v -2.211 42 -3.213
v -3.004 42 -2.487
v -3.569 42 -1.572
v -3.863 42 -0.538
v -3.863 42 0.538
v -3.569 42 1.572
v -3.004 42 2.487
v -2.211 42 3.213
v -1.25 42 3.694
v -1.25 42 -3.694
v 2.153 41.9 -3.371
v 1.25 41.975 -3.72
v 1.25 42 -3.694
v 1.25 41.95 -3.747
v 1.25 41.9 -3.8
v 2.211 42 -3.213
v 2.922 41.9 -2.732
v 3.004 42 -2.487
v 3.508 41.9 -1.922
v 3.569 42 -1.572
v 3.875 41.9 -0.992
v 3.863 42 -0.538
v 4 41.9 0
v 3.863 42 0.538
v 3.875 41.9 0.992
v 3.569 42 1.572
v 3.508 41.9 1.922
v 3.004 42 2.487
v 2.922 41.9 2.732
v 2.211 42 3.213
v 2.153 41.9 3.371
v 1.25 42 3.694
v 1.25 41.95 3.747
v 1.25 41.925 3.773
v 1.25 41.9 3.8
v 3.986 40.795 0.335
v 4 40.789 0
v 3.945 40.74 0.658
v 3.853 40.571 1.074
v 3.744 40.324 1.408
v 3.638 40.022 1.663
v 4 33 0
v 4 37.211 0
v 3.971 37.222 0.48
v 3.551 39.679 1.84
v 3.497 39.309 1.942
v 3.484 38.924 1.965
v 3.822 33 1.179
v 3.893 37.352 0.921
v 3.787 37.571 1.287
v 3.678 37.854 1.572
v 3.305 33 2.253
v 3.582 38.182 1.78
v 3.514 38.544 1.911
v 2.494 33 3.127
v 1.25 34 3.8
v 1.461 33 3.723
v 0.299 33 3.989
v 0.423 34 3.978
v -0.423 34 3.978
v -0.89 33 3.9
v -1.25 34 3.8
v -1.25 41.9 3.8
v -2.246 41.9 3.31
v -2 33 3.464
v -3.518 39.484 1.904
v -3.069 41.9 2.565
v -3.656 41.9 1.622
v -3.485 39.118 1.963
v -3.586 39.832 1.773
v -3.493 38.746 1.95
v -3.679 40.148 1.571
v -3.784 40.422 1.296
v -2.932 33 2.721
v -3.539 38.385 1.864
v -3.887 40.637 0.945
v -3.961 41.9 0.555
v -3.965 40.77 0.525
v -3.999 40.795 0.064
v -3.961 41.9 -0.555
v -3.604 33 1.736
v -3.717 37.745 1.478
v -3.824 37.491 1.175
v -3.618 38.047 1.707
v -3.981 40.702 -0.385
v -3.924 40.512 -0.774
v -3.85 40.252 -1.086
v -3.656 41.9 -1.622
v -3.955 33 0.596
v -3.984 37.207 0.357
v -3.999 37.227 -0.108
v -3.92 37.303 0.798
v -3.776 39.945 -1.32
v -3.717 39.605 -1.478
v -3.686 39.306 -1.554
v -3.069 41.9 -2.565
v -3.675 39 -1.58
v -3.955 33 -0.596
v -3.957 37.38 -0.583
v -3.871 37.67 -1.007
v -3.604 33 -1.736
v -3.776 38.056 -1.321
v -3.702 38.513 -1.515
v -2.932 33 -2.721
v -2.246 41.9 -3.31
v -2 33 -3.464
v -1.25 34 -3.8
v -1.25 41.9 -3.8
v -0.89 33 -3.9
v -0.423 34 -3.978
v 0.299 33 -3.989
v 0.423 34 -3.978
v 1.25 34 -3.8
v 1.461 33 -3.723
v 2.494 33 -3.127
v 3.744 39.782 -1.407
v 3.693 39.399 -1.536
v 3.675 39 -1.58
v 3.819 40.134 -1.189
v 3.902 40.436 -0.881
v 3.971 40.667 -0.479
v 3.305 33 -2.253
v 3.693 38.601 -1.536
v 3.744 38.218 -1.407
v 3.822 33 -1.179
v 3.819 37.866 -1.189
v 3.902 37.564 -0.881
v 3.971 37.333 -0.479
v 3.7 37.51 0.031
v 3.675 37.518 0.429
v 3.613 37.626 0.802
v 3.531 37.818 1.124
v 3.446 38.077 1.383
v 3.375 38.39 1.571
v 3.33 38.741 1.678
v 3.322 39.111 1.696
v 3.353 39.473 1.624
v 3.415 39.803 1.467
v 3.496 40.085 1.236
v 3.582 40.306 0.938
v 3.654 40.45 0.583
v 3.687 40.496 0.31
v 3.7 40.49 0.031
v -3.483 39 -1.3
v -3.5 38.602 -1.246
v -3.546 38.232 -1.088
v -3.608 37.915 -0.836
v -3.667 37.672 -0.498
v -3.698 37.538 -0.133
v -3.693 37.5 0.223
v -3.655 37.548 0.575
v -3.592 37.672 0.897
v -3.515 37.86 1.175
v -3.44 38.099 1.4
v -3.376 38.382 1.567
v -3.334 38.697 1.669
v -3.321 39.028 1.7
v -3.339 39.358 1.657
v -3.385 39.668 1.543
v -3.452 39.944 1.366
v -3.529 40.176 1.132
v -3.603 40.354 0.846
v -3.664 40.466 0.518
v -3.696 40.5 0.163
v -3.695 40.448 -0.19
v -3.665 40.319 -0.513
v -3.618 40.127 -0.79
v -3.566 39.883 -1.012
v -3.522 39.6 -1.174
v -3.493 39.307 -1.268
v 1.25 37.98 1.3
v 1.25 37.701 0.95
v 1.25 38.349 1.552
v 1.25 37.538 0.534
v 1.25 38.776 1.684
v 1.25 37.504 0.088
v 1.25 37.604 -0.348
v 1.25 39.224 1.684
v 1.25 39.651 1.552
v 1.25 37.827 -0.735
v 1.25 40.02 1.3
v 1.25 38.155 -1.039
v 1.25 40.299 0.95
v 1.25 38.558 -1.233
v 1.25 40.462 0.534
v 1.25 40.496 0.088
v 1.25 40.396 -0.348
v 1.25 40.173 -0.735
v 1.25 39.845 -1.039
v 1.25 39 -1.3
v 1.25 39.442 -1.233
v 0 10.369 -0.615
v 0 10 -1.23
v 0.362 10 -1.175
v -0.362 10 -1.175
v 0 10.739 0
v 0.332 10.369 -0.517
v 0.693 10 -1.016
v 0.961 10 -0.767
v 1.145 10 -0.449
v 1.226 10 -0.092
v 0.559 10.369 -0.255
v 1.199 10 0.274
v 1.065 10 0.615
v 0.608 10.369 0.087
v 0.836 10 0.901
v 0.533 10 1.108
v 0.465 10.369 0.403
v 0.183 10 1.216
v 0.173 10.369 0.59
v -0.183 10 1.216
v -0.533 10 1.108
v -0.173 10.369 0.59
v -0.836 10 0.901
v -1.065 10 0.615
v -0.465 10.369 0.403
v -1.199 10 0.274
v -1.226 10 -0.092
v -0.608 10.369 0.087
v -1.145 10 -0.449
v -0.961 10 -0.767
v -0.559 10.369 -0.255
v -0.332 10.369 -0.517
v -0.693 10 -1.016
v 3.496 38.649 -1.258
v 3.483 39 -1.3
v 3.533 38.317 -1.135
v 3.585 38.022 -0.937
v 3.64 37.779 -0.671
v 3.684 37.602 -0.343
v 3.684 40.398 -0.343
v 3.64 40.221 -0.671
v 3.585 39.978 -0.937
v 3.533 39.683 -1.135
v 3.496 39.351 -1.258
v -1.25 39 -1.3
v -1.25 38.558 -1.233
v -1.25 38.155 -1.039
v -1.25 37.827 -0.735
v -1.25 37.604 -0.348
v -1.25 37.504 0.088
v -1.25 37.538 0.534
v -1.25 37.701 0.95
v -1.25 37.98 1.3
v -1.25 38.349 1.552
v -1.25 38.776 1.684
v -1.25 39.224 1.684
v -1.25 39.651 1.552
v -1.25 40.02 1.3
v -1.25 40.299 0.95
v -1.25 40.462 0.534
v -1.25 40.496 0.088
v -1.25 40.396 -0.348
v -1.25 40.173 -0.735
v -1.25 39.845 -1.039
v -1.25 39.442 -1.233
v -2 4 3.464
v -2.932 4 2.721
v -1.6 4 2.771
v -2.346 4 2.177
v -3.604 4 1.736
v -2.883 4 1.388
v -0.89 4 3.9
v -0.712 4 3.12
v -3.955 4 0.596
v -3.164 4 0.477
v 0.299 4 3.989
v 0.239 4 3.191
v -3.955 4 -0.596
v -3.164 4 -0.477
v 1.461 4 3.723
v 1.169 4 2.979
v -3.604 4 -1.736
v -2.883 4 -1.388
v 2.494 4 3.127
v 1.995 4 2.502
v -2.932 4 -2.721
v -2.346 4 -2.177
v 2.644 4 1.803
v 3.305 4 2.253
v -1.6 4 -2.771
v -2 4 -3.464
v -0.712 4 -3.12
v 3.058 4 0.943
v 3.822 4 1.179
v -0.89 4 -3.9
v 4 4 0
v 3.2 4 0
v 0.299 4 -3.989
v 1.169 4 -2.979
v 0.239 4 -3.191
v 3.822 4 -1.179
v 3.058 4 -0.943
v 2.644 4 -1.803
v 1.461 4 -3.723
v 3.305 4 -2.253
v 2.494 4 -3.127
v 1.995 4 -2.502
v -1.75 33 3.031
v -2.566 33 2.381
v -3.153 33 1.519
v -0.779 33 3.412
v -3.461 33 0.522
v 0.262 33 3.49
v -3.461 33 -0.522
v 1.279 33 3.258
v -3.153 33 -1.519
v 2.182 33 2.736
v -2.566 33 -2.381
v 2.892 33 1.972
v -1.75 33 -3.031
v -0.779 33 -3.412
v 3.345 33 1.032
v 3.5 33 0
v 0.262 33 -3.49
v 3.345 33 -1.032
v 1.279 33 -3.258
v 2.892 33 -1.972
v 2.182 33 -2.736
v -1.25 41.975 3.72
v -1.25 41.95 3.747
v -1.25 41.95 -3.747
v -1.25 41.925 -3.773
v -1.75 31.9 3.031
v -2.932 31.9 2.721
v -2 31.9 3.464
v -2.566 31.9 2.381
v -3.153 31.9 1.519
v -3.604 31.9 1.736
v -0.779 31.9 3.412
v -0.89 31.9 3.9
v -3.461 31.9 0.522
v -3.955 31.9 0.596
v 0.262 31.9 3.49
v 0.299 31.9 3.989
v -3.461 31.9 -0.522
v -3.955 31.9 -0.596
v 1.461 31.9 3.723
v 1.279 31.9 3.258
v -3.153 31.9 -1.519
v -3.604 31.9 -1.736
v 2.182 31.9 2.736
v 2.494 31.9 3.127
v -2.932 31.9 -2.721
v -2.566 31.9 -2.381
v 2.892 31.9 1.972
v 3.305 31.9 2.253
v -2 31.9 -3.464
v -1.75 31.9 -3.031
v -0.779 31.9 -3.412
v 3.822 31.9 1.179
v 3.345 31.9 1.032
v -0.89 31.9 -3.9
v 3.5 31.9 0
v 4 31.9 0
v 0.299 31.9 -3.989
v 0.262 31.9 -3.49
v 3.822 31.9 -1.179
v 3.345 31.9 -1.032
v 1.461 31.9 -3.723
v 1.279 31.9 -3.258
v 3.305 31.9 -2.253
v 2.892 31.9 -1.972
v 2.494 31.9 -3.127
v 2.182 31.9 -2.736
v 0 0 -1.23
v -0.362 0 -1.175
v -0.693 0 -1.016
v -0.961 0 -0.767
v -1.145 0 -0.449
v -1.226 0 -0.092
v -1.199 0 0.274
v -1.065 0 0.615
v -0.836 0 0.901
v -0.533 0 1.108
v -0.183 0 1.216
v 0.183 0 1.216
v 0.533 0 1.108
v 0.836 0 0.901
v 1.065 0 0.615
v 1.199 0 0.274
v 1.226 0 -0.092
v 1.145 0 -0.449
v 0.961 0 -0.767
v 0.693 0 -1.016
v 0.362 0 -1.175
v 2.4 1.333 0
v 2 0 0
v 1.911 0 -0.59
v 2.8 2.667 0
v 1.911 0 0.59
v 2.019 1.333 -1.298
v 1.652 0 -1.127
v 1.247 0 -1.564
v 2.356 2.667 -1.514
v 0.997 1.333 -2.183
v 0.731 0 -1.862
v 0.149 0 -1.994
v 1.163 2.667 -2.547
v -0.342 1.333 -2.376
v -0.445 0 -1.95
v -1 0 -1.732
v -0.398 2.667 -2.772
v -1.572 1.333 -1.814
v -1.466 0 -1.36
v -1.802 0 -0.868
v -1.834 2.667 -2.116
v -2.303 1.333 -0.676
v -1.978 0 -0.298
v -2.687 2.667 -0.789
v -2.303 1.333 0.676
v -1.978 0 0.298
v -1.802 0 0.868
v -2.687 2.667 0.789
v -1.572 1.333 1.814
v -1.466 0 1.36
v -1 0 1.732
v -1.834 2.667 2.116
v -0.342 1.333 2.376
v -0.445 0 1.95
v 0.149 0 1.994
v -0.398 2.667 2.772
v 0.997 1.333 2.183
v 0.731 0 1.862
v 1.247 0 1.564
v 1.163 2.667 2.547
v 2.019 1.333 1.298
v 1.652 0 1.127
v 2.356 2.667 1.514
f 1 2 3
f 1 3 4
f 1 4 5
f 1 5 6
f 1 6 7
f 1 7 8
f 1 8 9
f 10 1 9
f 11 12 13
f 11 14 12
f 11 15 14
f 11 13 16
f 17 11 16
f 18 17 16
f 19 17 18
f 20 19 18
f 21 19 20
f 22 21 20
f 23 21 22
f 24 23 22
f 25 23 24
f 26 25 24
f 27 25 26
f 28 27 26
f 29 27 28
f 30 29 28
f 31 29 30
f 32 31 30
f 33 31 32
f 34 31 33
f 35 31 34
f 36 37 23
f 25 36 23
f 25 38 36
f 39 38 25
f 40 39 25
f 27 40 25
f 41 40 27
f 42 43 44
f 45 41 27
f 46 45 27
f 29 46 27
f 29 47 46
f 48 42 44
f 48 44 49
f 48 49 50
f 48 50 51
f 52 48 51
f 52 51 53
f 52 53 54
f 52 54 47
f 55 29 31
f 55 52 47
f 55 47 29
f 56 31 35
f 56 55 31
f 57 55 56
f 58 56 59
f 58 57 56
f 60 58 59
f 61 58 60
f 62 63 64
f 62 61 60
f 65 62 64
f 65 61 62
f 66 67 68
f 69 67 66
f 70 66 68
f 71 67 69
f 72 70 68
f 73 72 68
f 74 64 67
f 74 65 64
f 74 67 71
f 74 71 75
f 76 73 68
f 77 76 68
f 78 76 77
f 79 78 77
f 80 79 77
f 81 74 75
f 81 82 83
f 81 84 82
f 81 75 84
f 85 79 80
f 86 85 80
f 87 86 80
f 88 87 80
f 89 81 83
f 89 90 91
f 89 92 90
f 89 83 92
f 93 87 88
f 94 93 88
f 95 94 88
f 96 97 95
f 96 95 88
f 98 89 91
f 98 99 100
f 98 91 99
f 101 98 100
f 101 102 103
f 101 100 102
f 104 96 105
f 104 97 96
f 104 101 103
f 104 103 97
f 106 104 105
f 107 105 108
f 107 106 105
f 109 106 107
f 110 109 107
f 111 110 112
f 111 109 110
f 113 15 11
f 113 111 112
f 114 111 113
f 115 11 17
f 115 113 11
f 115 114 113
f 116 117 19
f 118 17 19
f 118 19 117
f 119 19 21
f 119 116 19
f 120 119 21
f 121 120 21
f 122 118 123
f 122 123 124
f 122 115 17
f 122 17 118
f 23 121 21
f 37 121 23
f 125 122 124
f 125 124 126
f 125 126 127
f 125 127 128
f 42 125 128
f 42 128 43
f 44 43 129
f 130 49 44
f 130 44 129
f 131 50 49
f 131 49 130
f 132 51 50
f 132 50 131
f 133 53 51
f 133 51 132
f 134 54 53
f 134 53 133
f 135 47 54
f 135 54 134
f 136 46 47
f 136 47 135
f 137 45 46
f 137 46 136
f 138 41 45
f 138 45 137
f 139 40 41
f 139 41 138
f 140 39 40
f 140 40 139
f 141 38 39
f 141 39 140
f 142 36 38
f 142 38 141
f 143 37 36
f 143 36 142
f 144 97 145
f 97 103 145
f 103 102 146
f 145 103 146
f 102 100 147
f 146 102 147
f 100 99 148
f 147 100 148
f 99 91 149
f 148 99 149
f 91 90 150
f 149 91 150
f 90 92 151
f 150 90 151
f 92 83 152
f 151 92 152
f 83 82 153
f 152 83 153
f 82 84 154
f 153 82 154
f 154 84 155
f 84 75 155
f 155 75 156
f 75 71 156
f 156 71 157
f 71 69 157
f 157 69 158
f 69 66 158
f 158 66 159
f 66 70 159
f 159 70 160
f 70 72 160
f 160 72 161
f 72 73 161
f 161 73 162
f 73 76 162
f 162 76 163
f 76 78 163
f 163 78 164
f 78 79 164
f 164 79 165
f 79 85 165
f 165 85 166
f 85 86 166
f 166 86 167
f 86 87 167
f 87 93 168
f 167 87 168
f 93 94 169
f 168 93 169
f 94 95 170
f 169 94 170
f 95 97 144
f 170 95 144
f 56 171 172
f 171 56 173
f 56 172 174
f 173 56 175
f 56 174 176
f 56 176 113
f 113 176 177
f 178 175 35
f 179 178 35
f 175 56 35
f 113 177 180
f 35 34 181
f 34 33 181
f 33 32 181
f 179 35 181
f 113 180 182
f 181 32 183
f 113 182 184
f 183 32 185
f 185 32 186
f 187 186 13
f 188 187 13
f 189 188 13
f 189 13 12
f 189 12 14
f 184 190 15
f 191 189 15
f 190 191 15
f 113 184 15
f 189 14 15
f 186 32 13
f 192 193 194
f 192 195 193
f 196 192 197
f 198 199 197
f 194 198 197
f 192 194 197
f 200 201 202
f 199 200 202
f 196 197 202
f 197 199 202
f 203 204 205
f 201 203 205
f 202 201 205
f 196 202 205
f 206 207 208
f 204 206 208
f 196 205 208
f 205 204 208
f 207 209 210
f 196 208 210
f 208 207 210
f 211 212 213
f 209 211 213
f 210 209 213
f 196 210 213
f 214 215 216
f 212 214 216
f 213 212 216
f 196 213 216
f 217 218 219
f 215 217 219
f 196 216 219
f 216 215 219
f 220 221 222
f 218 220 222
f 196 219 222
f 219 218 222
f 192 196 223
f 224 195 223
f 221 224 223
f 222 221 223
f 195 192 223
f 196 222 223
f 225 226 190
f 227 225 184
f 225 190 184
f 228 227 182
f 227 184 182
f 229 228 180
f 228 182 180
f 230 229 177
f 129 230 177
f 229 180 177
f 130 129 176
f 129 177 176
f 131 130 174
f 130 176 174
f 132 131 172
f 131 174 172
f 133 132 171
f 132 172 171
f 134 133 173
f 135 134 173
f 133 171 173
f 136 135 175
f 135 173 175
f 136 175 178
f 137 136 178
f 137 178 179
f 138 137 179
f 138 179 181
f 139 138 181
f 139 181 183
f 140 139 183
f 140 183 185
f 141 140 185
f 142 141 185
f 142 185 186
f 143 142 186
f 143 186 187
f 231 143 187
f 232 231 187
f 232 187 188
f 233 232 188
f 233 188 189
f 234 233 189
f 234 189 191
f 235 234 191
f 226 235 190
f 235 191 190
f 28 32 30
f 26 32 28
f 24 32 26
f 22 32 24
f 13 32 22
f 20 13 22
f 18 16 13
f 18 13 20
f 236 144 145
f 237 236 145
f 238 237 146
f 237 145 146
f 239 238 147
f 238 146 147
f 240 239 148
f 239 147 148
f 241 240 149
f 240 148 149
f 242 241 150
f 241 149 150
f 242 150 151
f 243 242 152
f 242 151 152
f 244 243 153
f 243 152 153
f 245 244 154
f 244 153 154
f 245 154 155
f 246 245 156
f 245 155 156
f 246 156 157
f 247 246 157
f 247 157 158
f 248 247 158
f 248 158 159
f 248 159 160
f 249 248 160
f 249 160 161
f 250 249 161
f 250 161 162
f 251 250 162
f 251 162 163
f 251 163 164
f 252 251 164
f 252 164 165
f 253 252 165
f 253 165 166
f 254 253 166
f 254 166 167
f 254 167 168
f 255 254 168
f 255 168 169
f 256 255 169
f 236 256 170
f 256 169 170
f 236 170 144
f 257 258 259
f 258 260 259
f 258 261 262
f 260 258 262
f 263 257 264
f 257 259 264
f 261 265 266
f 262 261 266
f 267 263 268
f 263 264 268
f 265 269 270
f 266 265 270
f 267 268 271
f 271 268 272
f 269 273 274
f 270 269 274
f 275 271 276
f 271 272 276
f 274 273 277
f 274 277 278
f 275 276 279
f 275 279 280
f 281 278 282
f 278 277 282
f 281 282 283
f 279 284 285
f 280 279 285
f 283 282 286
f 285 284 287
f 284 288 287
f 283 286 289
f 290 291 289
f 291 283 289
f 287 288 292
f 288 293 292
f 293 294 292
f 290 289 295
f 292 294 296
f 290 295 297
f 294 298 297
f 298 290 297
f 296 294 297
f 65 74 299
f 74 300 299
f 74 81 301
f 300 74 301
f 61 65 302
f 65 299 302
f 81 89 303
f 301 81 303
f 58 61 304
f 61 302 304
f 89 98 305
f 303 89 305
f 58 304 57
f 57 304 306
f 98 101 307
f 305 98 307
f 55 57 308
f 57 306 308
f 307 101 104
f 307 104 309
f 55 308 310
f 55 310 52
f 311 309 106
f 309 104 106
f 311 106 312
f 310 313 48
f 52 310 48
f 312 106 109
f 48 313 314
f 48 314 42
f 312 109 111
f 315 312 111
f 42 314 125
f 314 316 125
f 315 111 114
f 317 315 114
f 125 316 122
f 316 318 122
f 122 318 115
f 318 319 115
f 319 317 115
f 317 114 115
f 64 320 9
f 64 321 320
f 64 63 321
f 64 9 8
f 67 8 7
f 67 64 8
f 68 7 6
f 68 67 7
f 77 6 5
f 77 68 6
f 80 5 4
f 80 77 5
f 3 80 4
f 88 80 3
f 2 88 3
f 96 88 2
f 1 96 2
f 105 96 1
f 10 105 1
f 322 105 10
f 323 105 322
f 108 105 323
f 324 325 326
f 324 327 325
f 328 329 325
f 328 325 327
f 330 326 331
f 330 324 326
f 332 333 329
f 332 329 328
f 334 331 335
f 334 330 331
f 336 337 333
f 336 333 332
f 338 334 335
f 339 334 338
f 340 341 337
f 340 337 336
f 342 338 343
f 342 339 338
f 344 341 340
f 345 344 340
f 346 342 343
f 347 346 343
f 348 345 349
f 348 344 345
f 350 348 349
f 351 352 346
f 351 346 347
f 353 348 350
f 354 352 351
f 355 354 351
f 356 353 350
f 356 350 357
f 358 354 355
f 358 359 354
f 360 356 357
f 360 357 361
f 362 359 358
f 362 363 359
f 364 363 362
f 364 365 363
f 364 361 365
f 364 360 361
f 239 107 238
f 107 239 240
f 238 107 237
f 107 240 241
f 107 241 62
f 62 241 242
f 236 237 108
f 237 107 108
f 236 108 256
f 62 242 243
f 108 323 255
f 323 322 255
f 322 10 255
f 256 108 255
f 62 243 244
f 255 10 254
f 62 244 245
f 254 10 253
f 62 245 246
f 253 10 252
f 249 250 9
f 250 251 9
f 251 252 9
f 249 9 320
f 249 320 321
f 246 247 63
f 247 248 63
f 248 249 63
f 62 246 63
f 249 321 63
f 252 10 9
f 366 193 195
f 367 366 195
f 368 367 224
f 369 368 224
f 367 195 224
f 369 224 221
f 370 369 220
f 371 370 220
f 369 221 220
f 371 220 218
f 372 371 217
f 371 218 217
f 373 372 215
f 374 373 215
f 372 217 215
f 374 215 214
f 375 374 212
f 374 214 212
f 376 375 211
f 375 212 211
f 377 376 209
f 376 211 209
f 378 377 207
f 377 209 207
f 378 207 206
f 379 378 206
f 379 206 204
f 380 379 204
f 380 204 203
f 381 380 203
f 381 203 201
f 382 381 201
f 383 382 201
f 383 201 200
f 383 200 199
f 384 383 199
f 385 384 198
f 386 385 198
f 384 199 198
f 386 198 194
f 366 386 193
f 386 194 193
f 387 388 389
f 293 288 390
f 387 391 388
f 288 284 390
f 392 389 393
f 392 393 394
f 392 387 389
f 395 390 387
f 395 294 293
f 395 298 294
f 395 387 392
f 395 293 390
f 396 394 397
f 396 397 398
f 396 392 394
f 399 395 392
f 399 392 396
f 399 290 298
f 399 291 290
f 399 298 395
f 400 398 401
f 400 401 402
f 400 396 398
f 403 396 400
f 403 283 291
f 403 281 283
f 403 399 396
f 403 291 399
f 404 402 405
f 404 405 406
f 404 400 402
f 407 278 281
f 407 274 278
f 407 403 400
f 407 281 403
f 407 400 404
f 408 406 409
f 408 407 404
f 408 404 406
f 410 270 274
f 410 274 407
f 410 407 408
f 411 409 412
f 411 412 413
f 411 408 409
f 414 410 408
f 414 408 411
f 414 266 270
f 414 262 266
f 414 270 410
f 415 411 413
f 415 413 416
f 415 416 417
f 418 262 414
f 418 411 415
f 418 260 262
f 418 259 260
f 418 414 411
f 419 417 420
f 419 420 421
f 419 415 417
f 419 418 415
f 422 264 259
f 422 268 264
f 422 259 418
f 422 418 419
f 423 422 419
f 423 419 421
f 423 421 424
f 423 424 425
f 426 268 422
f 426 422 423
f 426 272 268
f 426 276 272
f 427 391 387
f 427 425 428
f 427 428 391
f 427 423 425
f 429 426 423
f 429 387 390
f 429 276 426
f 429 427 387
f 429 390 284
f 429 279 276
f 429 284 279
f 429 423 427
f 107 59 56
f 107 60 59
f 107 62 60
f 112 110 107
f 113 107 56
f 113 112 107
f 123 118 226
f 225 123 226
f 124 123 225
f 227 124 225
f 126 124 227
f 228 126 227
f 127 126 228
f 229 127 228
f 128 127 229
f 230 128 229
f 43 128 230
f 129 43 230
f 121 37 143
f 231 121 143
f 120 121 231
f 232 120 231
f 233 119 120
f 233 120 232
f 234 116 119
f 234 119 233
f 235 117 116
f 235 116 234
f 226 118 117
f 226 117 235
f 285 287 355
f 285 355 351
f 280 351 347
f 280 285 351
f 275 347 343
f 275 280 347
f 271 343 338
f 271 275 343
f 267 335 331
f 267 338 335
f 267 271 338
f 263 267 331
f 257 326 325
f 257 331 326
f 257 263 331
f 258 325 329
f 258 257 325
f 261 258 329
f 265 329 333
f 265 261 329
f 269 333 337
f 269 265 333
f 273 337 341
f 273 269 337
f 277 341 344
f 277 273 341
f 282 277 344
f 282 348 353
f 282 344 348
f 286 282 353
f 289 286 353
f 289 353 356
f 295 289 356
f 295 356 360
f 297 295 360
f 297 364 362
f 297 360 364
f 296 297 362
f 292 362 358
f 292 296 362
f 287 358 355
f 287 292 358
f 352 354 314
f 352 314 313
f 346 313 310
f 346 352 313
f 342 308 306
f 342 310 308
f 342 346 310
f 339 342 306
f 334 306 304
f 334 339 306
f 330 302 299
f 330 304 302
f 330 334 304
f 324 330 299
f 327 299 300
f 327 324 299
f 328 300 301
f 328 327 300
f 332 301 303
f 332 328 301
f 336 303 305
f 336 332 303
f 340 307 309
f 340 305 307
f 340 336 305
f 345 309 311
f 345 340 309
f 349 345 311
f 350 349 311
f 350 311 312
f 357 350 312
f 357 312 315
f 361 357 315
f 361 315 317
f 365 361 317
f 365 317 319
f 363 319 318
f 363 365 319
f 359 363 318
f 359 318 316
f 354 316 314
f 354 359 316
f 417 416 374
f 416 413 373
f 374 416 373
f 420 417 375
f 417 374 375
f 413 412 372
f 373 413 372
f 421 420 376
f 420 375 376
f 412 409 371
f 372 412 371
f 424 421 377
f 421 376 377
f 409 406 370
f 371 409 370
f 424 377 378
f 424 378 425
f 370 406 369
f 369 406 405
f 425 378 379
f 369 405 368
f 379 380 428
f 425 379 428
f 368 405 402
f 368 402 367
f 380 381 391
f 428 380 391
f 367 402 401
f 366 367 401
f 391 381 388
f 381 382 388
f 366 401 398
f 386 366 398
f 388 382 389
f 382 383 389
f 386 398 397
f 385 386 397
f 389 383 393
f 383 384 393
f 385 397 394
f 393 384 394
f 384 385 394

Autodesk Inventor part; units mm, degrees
ref_plane "YZ Plane" through (0, 0, 0) normal (1, 0, 0) x (0, 1, 0)
ref_plane "XZ Plane" through (0, 0, 0) normal (0, 1, 0) x (-1, 0, 0)
ref_plane "XY Plane" through (0, 0, 0) normal (0, 0, 1) x (1, 0, 0)
sketch "Эскиз1" plane through (0, 0, 0) normal (0, 0, 1) x (1, 0, 0)
  line L0 (0, 0) -> (0, 50)
  line L1 (0, 42) -> (4, 42)
  line L2 (4, 42) -> (4, 33)
  line L3 (4, 33) -> (3.5, 33)
  line L4 (3.5, 33) -> (3.5, 31.9)
  line L5 (3.5, 31.9) -> (4, 31.9)
  line L6 (4, 31.9) -> (4, 4)
  line L7 (2, 0) -> (0, 0)
  line L8 (4, 4) -> (3.2, 4)
  line L9 (3.2, 4) -> (2, 0)
  dimension "d0" = 50
  dimension "d2" = 8
  dimension "d3" = 0.5
  dimension "d7" = 9
  dimension "d38" = 1.1
  dimension "d39" = 0.8
  dimension "d40" = 4
  dimension "d41" = 42
revolve "Вращение1" add sketch "Эскиз1" angle 360 about axis through (0, 0, 0) along (0, 1, 0)
hole "Отверстие1" at (0, 0, 0) direction (0, 1, 0) diameter 2.459 depth 10 tip angle 118 thread size "M3x0.5" class "6H" standard "ANSI Metric M Profile"
chamfer "Фаска1" distance 0.1 angle 45 1 edges at (-4, 42, 0)
sketch "Эскиз2" plane through (0, 42, 0) normal (0, 1, 0) x (1, 0, 0)
  circle A0 centre (0, 0) radius 3.9 projected
  line L0 (1.25, 4.0963) -> (-1.25, 4.0963)
  line L1 (-1.25, 4.0963) -> (-1.25, -4.0963)
  line L2 (-1.25, -4.0963) -> (1.25, -4.0963)
  line L3 (1.25, -4.0963) -> (1.25, 4.0963)
  line L4 (1.25, 4.0963) -> (-1.25, -4.0963) construction
  line L5 (-1.25, 4.0963) -> (1.25, -4.0963) construction
  dimension "d23" = 2.5
extrude "Выдавливание1" cut sketch "Эскиз2" against normal blind 8 contours L3 A0 L1 | A0 L1 L0 L3 | L3 L2 L1 A0
hole "Отверстие2" at (-1.25, 39, 0.2003) direction (-1, 0, 0) diameter 3 end through all both
chamfer "Фаска2" distance 0.3 angle 45 4 edges at (3.8791, 39.9309, -0.9759) (3.8791, 38.0692, -0.9759) (3.6206, 38.9989, 1.7003) (-3.6206, 39.0021, 1.7003)
properties part number "kern"
